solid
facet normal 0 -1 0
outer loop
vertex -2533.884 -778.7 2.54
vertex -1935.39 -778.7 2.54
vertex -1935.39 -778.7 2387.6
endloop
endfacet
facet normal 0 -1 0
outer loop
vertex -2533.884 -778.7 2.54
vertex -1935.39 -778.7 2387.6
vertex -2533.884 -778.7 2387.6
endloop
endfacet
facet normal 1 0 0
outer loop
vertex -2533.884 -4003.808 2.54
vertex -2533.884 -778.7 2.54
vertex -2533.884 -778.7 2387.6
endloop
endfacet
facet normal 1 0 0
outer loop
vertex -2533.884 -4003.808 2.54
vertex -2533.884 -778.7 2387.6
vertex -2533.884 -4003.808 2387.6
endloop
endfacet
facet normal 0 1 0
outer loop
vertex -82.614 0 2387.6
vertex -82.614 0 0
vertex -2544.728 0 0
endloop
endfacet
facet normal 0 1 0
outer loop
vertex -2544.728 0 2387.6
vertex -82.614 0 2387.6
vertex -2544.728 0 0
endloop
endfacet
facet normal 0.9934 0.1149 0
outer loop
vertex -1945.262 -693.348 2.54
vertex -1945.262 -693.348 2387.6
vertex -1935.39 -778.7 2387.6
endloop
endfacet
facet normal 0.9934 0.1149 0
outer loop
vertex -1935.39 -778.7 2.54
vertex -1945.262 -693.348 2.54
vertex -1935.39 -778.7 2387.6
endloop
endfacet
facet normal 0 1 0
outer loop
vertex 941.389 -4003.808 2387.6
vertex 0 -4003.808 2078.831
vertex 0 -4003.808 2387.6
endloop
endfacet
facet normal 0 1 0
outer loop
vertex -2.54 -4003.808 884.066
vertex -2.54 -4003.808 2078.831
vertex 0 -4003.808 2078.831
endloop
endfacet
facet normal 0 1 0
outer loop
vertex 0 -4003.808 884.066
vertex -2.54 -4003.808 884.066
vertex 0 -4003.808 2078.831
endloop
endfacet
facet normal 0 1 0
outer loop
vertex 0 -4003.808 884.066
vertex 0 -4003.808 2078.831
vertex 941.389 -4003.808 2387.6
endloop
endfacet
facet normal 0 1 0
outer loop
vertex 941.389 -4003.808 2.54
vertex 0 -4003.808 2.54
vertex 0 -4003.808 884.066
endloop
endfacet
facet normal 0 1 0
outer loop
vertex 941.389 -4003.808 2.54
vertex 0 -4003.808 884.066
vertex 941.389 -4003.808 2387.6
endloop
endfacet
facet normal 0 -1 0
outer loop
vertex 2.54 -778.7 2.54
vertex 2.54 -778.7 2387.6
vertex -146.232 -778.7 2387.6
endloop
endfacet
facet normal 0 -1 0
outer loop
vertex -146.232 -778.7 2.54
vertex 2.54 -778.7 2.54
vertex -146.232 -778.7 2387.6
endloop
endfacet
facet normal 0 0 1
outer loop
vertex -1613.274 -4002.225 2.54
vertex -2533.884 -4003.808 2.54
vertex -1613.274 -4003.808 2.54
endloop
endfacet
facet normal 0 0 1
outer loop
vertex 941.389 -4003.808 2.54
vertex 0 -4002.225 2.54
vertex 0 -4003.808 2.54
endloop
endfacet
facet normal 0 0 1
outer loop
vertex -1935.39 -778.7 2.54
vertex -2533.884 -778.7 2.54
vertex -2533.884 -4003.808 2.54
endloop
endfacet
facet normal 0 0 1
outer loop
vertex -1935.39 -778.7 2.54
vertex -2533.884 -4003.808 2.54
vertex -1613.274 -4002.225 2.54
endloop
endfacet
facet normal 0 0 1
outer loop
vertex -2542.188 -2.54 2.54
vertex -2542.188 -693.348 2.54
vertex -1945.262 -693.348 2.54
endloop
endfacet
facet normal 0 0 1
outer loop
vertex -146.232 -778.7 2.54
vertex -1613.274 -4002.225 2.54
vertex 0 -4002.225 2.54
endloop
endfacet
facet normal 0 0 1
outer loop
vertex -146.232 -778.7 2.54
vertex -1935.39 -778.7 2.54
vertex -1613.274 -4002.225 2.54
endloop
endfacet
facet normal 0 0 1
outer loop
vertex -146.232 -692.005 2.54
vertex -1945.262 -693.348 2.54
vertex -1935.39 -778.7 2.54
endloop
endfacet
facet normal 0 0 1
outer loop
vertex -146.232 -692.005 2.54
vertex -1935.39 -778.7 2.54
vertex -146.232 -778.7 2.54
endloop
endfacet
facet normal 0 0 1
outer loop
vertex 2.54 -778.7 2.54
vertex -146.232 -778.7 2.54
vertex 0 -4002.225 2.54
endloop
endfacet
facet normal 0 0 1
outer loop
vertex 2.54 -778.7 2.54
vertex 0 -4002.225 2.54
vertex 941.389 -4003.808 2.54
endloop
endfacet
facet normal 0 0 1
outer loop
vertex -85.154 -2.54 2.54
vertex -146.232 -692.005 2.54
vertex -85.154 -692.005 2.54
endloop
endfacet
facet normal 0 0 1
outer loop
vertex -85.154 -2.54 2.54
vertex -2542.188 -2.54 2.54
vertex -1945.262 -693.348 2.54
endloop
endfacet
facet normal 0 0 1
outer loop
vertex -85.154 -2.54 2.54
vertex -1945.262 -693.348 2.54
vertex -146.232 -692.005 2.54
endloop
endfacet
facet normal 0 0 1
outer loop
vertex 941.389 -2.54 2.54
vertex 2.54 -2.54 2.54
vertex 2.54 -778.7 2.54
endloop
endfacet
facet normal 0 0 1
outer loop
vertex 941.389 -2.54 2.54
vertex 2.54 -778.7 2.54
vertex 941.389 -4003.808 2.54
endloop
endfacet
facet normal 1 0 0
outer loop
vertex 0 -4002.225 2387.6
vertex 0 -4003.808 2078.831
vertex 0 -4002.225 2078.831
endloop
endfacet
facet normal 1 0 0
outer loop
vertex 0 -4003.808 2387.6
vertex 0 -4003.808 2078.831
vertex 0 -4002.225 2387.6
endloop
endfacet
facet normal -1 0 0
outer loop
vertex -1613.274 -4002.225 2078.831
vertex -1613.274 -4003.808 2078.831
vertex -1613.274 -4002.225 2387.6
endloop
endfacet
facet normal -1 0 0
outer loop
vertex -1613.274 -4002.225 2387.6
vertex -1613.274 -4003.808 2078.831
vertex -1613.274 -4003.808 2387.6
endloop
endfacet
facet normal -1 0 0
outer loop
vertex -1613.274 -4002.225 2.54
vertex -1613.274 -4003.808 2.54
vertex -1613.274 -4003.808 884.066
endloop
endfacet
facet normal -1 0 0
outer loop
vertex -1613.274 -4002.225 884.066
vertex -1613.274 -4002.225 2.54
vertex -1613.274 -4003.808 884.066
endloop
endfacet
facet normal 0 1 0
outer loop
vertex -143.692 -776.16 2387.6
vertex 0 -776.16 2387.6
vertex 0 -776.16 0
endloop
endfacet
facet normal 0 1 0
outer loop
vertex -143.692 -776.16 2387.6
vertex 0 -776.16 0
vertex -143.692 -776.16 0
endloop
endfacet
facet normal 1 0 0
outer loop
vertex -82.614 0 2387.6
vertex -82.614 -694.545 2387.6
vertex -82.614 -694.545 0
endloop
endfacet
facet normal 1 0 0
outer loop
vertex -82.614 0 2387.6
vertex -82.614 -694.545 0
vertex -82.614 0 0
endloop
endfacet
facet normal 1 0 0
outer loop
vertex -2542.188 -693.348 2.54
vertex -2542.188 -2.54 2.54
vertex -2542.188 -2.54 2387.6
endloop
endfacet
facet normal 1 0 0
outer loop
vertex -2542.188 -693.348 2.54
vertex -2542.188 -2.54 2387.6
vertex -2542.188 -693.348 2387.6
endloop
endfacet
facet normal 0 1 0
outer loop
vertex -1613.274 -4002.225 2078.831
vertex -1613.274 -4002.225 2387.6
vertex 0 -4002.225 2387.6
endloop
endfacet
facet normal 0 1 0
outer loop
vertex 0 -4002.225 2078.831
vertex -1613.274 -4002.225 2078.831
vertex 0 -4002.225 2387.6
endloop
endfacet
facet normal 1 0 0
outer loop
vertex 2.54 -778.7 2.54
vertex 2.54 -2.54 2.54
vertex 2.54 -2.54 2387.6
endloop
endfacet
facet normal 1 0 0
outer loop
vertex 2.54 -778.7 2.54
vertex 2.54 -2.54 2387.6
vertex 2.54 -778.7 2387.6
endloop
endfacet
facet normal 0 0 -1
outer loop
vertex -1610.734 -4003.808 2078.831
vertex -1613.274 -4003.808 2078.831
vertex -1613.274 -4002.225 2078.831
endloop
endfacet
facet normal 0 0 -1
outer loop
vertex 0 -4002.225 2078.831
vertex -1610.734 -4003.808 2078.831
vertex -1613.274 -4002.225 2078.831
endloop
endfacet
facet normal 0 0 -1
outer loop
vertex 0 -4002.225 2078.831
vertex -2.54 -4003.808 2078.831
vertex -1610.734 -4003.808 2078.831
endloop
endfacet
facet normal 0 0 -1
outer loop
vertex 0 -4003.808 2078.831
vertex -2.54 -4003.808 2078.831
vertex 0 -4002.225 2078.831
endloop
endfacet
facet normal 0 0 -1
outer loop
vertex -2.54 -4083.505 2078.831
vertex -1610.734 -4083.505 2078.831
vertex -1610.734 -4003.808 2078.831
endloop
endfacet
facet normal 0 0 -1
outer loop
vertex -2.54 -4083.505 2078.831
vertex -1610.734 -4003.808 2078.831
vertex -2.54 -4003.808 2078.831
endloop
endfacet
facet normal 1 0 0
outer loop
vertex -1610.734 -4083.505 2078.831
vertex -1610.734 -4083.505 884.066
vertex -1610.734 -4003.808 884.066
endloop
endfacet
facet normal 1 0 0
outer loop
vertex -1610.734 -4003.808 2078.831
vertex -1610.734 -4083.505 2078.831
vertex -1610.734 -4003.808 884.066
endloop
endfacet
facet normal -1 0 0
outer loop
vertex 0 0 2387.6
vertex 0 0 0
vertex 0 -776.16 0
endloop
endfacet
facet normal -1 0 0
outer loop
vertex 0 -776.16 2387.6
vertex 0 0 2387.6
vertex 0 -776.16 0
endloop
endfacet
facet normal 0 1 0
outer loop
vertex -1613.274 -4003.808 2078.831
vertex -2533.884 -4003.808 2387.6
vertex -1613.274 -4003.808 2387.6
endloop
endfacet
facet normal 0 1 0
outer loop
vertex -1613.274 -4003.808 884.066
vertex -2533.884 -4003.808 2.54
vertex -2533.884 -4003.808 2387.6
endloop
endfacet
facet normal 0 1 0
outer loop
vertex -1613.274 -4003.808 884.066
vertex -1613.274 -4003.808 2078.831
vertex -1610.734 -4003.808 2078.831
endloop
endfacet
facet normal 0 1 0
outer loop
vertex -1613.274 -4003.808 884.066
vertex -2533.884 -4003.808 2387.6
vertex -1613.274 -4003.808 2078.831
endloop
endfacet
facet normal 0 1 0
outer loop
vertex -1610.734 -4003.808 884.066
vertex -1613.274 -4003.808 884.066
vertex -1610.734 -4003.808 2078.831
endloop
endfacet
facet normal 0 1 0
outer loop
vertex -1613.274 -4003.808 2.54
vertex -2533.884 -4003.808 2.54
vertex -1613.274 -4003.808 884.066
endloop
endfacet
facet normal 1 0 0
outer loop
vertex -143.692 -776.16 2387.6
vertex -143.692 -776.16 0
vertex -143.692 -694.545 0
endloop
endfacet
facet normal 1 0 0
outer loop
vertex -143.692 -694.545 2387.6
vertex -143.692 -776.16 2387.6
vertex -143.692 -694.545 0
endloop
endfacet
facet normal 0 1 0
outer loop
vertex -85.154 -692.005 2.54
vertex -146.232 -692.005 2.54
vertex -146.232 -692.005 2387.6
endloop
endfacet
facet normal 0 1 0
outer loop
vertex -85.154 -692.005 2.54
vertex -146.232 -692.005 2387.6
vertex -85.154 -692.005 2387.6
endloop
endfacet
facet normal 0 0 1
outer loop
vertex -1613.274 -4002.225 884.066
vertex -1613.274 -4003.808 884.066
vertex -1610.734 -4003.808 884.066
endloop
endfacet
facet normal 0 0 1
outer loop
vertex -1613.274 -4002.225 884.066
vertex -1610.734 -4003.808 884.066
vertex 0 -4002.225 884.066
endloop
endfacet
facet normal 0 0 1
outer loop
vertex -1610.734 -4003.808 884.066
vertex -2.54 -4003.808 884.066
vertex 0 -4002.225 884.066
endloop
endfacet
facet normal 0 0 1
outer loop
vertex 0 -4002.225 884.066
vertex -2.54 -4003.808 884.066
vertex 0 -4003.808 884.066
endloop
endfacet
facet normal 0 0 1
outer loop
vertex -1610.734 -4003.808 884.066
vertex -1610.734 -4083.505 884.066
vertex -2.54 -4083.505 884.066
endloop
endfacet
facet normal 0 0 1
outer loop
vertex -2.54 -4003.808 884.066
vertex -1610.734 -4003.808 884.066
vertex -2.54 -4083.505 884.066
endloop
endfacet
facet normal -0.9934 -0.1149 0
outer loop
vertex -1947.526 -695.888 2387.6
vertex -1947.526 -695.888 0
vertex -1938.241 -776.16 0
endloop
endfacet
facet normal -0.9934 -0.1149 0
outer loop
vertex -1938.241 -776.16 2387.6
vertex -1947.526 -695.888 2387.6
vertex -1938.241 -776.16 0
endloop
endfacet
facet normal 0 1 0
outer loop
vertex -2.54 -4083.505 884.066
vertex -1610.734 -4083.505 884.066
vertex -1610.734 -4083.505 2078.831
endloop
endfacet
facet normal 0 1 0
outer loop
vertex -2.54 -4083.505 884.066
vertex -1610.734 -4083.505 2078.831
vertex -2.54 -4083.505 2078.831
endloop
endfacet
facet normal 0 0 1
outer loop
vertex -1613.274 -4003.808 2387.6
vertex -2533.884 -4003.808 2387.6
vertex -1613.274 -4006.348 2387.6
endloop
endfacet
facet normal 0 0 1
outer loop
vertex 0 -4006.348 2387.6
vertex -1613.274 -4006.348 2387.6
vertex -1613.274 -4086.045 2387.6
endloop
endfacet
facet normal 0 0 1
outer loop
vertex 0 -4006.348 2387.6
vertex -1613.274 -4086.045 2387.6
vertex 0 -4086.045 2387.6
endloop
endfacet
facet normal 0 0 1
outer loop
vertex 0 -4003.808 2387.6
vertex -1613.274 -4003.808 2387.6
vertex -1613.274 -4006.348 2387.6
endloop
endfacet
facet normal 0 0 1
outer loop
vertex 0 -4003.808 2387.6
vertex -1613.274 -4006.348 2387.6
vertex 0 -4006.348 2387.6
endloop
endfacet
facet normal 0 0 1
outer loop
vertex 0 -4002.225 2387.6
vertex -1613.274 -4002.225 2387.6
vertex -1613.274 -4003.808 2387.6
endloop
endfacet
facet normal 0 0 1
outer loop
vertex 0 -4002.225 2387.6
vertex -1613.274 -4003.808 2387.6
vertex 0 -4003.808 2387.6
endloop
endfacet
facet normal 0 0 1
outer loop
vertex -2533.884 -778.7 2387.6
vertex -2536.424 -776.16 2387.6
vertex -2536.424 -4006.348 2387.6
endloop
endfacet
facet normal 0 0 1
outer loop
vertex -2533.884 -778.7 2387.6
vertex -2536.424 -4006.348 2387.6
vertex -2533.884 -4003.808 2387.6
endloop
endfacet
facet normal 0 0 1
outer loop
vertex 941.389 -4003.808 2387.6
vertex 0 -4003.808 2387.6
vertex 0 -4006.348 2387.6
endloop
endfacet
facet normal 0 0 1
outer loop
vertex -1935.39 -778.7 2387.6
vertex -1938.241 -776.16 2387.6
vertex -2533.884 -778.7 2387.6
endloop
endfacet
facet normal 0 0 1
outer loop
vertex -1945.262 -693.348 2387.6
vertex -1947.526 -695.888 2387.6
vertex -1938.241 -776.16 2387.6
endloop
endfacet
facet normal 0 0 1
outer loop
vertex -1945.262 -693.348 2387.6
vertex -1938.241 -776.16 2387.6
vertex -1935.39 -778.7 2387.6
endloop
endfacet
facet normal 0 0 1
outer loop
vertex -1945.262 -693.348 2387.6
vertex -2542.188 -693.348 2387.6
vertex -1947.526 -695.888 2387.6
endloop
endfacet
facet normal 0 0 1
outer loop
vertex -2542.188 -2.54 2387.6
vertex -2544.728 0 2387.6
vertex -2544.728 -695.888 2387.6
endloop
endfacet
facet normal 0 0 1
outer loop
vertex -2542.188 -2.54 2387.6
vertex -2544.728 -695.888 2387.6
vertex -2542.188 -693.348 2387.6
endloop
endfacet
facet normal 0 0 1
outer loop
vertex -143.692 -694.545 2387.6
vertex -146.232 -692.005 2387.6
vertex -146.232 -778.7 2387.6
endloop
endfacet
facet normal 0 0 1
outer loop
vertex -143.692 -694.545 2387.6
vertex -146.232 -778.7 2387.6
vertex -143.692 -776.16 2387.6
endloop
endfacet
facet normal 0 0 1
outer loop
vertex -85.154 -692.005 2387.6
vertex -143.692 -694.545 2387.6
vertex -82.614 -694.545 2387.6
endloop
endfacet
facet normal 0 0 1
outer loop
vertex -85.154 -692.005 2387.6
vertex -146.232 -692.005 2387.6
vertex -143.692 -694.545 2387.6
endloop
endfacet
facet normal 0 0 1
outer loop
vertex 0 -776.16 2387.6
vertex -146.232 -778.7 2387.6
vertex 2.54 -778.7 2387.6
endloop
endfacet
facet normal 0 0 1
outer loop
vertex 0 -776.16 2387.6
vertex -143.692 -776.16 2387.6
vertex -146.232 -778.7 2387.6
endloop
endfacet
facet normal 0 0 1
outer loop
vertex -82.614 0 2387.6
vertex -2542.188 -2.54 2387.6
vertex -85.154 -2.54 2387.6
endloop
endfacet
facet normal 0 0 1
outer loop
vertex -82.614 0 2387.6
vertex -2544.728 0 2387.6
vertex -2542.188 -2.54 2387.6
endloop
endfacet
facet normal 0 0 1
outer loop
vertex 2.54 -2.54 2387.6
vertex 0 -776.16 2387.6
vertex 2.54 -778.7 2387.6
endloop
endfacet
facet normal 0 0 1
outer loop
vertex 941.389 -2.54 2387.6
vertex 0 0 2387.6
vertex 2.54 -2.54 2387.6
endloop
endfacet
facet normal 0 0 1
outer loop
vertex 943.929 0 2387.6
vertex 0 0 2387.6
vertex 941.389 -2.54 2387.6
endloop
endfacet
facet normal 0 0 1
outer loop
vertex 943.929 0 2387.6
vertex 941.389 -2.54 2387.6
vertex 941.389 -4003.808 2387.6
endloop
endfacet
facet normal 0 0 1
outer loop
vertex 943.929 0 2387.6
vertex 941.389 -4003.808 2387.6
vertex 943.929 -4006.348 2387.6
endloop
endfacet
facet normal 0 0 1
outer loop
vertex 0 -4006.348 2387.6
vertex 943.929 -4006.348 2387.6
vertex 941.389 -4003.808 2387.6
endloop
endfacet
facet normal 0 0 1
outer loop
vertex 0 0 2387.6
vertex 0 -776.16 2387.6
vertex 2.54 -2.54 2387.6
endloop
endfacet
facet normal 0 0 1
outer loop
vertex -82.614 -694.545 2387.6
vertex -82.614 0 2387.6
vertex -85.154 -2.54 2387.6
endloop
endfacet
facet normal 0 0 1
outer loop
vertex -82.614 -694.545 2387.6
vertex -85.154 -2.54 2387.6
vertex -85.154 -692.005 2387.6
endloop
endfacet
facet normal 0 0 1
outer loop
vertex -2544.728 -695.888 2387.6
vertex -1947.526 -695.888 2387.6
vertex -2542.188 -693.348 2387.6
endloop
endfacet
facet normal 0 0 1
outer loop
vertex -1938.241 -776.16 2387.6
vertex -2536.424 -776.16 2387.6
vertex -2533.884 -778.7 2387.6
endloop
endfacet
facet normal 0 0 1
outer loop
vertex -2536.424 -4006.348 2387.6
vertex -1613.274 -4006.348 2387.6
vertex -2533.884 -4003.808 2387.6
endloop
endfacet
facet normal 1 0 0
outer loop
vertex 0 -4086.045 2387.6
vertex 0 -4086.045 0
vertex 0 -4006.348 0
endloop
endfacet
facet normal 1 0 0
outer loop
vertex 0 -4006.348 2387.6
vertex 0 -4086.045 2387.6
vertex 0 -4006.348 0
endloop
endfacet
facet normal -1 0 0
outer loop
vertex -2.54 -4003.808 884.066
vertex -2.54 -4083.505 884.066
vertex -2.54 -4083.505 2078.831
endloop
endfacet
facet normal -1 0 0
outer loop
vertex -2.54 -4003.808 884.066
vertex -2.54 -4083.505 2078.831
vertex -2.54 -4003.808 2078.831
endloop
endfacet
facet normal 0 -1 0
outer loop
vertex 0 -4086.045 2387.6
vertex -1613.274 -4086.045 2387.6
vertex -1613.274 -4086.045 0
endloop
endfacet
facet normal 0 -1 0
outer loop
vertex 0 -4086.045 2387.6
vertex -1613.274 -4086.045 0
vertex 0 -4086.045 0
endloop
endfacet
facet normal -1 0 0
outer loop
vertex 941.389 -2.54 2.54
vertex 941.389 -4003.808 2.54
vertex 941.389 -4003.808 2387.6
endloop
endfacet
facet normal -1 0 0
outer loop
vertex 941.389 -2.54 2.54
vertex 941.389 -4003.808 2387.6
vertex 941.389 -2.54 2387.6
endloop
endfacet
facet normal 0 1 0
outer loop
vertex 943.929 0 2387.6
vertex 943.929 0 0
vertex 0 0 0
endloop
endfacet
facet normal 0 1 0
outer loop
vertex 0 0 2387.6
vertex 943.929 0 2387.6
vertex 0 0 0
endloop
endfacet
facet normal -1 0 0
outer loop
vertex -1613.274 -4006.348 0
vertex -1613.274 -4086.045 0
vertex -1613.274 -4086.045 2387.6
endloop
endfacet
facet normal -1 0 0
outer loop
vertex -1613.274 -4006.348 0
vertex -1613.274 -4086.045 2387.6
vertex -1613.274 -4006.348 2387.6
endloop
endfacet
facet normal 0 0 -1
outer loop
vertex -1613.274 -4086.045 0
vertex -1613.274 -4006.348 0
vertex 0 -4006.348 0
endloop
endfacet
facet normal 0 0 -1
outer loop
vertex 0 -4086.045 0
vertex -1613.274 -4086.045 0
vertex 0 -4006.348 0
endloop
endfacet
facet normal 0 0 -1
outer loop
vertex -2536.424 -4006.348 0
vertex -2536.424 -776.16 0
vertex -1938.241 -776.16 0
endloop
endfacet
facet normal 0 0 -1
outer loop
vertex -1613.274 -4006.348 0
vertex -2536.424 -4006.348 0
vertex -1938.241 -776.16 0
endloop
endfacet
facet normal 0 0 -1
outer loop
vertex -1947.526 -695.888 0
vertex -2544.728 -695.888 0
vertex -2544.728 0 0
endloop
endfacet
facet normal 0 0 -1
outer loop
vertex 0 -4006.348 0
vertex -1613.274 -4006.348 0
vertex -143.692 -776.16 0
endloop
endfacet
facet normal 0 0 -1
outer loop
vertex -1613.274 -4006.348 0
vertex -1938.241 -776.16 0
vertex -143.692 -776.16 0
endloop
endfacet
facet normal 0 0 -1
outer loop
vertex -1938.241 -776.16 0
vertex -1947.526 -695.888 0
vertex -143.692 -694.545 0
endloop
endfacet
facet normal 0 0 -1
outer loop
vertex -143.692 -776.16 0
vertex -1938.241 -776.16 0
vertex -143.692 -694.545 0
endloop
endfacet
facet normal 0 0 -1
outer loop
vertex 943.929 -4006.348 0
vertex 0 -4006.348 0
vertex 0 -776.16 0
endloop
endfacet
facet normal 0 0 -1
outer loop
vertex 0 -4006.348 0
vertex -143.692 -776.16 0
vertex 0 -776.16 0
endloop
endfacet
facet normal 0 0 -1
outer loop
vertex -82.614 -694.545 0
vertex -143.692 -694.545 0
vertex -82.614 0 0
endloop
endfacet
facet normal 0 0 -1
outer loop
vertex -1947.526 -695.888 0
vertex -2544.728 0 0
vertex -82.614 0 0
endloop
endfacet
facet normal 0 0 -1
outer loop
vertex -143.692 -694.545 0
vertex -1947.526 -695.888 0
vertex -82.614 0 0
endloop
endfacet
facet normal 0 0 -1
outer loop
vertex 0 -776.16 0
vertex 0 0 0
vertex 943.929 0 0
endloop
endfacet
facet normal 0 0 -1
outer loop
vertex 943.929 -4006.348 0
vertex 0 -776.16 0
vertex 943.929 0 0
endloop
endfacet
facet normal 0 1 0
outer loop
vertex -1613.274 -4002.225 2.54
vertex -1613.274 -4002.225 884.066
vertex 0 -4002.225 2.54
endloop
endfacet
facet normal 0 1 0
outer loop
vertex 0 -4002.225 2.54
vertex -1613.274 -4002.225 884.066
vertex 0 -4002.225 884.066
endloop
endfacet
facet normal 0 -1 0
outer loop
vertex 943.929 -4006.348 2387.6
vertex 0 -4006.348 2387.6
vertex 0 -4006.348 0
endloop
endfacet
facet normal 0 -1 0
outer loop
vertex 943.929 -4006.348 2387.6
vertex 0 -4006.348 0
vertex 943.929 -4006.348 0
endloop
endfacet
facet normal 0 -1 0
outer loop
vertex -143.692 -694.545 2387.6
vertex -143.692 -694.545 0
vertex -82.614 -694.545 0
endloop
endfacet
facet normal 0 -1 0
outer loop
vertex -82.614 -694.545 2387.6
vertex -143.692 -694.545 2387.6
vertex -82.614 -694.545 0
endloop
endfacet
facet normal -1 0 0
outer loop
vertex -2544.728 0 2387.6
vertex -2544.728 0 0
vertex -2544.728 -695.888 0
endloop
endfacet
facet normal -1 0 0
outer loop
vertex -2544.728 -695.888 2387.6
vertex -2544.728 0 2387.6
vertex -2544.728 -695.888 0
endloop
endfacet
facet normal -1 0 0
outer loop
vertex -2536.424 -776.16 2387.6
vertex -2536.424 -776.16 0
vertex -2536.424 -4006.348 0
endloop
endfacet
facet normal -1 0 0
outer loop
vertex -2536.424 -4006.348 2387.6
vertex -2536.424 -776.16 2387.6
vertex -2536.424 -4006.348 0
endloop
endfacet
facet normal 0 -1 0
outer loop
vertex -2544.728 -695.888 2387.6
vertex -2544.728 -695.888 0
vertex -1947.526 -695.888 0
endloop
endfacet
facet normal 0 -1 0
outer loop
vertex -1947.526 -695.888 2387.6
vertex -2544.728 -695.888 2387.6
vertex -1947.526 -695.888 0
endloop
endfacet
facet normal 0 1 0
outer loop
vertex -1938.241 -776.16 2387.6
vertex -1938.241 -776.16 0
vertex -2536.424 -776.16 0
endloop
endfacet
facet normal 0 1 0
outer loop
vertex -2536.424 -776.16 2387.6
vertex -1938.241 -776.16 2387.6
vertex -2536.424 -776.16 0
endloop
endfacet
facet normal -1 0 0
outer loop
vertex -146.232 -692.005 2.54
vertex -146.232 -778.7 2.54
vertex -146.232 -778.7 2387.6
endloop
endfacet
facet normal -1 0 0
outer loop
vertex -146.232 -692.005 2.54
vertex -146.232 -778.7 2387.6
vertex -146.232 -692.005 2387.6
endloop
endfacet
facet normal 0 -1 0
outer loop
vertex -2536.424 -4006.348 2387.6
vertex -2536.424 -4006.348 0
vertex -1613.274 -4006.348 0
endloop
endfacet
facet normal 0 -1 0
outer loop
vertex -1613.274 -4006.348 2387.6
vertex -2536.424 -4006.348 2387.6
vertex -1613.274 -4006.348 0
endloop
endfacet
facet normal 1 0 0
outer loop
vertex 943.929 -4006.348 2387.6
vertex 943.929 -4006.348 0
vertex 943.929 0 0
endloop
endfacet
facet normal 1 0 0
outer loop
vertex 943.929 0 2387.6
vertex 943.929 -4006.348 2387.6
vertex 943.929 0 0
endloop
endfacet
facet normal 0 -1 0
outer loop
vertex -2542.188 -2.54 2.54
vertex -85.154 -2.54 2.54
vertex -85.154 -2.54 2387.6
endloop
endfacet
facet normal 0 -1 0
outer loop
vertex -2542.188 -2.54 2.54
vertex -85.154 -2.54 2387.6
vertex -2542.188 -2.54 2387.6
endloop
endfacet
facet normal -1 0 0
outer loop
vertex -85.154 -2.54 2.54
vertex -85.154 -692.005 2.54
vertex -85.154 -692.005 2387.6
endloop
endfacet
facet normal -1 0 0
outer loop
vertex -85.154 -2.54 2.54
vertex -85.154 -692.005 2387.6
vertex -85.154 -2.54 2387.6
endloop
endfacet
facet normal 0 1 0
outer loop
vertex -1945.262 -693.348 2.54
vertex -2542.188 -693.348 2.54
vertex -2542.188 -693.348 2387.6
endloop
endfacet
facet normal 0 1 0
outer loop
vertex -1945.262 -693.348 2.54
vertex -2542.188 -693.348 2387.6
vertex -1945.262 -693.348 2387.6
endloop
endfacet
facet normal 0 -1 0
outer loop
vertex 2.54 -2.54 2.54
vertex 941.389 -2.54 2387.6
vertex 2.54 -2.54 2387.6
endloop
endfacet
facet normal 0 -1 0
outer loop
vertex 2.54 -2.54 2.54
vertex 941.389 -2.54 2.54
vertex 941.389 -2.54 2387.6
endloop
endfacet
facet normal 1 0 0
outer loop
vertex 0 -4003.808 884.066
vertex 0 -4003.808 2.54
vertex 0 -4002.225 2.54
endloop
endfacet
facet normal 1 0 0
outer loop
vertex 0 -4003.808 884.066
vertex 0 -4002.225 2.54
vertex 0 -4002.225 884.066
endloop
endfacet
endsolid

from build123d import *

# Parameters (mm, degrees)
F0_W     = 1613.2740974426
F0_H     = 79.6976089478
F1_DEPTH = 2387.6
F2_T     = -2.54
F3_W     = 1613.2740974426
F3_H     = 308.7692810059
F3_H_2   = 884.065747261
F4_DEPTH = 83.82


with BuildPart() as f1:
    # F0 (on Top) → F1 (new body)
    with BuildSketch(Plane.XY):
        Polygon((88.8126790524, 0), (0, 0), (0, -776.1600017548), (-143.6923742294, -776.1600017548), (-143.6923742294, -694.5448517799), (-82.6144218445, -694.5448517799), (-82.6144218445, 0), (-2544.727563858, 0), (-2544.727563858, -695.8884000778), (-1947.5255012512, -695.8884000778), (-1938.2410049438, -776.1600017548), (-2536.4239215851, -776.1600017548), (-2536.4239215851, -4006.34765625), (-1613.2740974426, -4006.34765625), (0, -4006.34765625), (943.929374218, -4006.34765625), (943.929374218, 0), (853.3876538277, 0), align=None)
        with Locations((-806.6370487213, -4046.1964607239)):
            Rectangle(F0_W, F0_H)
    extrude(amount=F1_DEPTH)

    # F2
    f2_openings = [f1.faces().sort_by_distance(p)[0] for p in [
        (-795.850363, -2033.498492, 2387.6),
    ]]
    offset(amount=F2_T, openings=f2_openings, kind=Kind.INTERSECTION)

    # F3 (on face) → F4 (join)
    with BuildSketch(Plane.XZ.offset(4086.0452651978)):
        with Locations((-806.6370487213, 2233.2153594971)):
            Rectangle(F3_W, F3_H)
        with Locations((-806.6370487213, 442.0328736305)):
            Rectangle(F3_W, F3_H_2)
    extrude(amount=-F4_DEPTH)


solid = f1.part
